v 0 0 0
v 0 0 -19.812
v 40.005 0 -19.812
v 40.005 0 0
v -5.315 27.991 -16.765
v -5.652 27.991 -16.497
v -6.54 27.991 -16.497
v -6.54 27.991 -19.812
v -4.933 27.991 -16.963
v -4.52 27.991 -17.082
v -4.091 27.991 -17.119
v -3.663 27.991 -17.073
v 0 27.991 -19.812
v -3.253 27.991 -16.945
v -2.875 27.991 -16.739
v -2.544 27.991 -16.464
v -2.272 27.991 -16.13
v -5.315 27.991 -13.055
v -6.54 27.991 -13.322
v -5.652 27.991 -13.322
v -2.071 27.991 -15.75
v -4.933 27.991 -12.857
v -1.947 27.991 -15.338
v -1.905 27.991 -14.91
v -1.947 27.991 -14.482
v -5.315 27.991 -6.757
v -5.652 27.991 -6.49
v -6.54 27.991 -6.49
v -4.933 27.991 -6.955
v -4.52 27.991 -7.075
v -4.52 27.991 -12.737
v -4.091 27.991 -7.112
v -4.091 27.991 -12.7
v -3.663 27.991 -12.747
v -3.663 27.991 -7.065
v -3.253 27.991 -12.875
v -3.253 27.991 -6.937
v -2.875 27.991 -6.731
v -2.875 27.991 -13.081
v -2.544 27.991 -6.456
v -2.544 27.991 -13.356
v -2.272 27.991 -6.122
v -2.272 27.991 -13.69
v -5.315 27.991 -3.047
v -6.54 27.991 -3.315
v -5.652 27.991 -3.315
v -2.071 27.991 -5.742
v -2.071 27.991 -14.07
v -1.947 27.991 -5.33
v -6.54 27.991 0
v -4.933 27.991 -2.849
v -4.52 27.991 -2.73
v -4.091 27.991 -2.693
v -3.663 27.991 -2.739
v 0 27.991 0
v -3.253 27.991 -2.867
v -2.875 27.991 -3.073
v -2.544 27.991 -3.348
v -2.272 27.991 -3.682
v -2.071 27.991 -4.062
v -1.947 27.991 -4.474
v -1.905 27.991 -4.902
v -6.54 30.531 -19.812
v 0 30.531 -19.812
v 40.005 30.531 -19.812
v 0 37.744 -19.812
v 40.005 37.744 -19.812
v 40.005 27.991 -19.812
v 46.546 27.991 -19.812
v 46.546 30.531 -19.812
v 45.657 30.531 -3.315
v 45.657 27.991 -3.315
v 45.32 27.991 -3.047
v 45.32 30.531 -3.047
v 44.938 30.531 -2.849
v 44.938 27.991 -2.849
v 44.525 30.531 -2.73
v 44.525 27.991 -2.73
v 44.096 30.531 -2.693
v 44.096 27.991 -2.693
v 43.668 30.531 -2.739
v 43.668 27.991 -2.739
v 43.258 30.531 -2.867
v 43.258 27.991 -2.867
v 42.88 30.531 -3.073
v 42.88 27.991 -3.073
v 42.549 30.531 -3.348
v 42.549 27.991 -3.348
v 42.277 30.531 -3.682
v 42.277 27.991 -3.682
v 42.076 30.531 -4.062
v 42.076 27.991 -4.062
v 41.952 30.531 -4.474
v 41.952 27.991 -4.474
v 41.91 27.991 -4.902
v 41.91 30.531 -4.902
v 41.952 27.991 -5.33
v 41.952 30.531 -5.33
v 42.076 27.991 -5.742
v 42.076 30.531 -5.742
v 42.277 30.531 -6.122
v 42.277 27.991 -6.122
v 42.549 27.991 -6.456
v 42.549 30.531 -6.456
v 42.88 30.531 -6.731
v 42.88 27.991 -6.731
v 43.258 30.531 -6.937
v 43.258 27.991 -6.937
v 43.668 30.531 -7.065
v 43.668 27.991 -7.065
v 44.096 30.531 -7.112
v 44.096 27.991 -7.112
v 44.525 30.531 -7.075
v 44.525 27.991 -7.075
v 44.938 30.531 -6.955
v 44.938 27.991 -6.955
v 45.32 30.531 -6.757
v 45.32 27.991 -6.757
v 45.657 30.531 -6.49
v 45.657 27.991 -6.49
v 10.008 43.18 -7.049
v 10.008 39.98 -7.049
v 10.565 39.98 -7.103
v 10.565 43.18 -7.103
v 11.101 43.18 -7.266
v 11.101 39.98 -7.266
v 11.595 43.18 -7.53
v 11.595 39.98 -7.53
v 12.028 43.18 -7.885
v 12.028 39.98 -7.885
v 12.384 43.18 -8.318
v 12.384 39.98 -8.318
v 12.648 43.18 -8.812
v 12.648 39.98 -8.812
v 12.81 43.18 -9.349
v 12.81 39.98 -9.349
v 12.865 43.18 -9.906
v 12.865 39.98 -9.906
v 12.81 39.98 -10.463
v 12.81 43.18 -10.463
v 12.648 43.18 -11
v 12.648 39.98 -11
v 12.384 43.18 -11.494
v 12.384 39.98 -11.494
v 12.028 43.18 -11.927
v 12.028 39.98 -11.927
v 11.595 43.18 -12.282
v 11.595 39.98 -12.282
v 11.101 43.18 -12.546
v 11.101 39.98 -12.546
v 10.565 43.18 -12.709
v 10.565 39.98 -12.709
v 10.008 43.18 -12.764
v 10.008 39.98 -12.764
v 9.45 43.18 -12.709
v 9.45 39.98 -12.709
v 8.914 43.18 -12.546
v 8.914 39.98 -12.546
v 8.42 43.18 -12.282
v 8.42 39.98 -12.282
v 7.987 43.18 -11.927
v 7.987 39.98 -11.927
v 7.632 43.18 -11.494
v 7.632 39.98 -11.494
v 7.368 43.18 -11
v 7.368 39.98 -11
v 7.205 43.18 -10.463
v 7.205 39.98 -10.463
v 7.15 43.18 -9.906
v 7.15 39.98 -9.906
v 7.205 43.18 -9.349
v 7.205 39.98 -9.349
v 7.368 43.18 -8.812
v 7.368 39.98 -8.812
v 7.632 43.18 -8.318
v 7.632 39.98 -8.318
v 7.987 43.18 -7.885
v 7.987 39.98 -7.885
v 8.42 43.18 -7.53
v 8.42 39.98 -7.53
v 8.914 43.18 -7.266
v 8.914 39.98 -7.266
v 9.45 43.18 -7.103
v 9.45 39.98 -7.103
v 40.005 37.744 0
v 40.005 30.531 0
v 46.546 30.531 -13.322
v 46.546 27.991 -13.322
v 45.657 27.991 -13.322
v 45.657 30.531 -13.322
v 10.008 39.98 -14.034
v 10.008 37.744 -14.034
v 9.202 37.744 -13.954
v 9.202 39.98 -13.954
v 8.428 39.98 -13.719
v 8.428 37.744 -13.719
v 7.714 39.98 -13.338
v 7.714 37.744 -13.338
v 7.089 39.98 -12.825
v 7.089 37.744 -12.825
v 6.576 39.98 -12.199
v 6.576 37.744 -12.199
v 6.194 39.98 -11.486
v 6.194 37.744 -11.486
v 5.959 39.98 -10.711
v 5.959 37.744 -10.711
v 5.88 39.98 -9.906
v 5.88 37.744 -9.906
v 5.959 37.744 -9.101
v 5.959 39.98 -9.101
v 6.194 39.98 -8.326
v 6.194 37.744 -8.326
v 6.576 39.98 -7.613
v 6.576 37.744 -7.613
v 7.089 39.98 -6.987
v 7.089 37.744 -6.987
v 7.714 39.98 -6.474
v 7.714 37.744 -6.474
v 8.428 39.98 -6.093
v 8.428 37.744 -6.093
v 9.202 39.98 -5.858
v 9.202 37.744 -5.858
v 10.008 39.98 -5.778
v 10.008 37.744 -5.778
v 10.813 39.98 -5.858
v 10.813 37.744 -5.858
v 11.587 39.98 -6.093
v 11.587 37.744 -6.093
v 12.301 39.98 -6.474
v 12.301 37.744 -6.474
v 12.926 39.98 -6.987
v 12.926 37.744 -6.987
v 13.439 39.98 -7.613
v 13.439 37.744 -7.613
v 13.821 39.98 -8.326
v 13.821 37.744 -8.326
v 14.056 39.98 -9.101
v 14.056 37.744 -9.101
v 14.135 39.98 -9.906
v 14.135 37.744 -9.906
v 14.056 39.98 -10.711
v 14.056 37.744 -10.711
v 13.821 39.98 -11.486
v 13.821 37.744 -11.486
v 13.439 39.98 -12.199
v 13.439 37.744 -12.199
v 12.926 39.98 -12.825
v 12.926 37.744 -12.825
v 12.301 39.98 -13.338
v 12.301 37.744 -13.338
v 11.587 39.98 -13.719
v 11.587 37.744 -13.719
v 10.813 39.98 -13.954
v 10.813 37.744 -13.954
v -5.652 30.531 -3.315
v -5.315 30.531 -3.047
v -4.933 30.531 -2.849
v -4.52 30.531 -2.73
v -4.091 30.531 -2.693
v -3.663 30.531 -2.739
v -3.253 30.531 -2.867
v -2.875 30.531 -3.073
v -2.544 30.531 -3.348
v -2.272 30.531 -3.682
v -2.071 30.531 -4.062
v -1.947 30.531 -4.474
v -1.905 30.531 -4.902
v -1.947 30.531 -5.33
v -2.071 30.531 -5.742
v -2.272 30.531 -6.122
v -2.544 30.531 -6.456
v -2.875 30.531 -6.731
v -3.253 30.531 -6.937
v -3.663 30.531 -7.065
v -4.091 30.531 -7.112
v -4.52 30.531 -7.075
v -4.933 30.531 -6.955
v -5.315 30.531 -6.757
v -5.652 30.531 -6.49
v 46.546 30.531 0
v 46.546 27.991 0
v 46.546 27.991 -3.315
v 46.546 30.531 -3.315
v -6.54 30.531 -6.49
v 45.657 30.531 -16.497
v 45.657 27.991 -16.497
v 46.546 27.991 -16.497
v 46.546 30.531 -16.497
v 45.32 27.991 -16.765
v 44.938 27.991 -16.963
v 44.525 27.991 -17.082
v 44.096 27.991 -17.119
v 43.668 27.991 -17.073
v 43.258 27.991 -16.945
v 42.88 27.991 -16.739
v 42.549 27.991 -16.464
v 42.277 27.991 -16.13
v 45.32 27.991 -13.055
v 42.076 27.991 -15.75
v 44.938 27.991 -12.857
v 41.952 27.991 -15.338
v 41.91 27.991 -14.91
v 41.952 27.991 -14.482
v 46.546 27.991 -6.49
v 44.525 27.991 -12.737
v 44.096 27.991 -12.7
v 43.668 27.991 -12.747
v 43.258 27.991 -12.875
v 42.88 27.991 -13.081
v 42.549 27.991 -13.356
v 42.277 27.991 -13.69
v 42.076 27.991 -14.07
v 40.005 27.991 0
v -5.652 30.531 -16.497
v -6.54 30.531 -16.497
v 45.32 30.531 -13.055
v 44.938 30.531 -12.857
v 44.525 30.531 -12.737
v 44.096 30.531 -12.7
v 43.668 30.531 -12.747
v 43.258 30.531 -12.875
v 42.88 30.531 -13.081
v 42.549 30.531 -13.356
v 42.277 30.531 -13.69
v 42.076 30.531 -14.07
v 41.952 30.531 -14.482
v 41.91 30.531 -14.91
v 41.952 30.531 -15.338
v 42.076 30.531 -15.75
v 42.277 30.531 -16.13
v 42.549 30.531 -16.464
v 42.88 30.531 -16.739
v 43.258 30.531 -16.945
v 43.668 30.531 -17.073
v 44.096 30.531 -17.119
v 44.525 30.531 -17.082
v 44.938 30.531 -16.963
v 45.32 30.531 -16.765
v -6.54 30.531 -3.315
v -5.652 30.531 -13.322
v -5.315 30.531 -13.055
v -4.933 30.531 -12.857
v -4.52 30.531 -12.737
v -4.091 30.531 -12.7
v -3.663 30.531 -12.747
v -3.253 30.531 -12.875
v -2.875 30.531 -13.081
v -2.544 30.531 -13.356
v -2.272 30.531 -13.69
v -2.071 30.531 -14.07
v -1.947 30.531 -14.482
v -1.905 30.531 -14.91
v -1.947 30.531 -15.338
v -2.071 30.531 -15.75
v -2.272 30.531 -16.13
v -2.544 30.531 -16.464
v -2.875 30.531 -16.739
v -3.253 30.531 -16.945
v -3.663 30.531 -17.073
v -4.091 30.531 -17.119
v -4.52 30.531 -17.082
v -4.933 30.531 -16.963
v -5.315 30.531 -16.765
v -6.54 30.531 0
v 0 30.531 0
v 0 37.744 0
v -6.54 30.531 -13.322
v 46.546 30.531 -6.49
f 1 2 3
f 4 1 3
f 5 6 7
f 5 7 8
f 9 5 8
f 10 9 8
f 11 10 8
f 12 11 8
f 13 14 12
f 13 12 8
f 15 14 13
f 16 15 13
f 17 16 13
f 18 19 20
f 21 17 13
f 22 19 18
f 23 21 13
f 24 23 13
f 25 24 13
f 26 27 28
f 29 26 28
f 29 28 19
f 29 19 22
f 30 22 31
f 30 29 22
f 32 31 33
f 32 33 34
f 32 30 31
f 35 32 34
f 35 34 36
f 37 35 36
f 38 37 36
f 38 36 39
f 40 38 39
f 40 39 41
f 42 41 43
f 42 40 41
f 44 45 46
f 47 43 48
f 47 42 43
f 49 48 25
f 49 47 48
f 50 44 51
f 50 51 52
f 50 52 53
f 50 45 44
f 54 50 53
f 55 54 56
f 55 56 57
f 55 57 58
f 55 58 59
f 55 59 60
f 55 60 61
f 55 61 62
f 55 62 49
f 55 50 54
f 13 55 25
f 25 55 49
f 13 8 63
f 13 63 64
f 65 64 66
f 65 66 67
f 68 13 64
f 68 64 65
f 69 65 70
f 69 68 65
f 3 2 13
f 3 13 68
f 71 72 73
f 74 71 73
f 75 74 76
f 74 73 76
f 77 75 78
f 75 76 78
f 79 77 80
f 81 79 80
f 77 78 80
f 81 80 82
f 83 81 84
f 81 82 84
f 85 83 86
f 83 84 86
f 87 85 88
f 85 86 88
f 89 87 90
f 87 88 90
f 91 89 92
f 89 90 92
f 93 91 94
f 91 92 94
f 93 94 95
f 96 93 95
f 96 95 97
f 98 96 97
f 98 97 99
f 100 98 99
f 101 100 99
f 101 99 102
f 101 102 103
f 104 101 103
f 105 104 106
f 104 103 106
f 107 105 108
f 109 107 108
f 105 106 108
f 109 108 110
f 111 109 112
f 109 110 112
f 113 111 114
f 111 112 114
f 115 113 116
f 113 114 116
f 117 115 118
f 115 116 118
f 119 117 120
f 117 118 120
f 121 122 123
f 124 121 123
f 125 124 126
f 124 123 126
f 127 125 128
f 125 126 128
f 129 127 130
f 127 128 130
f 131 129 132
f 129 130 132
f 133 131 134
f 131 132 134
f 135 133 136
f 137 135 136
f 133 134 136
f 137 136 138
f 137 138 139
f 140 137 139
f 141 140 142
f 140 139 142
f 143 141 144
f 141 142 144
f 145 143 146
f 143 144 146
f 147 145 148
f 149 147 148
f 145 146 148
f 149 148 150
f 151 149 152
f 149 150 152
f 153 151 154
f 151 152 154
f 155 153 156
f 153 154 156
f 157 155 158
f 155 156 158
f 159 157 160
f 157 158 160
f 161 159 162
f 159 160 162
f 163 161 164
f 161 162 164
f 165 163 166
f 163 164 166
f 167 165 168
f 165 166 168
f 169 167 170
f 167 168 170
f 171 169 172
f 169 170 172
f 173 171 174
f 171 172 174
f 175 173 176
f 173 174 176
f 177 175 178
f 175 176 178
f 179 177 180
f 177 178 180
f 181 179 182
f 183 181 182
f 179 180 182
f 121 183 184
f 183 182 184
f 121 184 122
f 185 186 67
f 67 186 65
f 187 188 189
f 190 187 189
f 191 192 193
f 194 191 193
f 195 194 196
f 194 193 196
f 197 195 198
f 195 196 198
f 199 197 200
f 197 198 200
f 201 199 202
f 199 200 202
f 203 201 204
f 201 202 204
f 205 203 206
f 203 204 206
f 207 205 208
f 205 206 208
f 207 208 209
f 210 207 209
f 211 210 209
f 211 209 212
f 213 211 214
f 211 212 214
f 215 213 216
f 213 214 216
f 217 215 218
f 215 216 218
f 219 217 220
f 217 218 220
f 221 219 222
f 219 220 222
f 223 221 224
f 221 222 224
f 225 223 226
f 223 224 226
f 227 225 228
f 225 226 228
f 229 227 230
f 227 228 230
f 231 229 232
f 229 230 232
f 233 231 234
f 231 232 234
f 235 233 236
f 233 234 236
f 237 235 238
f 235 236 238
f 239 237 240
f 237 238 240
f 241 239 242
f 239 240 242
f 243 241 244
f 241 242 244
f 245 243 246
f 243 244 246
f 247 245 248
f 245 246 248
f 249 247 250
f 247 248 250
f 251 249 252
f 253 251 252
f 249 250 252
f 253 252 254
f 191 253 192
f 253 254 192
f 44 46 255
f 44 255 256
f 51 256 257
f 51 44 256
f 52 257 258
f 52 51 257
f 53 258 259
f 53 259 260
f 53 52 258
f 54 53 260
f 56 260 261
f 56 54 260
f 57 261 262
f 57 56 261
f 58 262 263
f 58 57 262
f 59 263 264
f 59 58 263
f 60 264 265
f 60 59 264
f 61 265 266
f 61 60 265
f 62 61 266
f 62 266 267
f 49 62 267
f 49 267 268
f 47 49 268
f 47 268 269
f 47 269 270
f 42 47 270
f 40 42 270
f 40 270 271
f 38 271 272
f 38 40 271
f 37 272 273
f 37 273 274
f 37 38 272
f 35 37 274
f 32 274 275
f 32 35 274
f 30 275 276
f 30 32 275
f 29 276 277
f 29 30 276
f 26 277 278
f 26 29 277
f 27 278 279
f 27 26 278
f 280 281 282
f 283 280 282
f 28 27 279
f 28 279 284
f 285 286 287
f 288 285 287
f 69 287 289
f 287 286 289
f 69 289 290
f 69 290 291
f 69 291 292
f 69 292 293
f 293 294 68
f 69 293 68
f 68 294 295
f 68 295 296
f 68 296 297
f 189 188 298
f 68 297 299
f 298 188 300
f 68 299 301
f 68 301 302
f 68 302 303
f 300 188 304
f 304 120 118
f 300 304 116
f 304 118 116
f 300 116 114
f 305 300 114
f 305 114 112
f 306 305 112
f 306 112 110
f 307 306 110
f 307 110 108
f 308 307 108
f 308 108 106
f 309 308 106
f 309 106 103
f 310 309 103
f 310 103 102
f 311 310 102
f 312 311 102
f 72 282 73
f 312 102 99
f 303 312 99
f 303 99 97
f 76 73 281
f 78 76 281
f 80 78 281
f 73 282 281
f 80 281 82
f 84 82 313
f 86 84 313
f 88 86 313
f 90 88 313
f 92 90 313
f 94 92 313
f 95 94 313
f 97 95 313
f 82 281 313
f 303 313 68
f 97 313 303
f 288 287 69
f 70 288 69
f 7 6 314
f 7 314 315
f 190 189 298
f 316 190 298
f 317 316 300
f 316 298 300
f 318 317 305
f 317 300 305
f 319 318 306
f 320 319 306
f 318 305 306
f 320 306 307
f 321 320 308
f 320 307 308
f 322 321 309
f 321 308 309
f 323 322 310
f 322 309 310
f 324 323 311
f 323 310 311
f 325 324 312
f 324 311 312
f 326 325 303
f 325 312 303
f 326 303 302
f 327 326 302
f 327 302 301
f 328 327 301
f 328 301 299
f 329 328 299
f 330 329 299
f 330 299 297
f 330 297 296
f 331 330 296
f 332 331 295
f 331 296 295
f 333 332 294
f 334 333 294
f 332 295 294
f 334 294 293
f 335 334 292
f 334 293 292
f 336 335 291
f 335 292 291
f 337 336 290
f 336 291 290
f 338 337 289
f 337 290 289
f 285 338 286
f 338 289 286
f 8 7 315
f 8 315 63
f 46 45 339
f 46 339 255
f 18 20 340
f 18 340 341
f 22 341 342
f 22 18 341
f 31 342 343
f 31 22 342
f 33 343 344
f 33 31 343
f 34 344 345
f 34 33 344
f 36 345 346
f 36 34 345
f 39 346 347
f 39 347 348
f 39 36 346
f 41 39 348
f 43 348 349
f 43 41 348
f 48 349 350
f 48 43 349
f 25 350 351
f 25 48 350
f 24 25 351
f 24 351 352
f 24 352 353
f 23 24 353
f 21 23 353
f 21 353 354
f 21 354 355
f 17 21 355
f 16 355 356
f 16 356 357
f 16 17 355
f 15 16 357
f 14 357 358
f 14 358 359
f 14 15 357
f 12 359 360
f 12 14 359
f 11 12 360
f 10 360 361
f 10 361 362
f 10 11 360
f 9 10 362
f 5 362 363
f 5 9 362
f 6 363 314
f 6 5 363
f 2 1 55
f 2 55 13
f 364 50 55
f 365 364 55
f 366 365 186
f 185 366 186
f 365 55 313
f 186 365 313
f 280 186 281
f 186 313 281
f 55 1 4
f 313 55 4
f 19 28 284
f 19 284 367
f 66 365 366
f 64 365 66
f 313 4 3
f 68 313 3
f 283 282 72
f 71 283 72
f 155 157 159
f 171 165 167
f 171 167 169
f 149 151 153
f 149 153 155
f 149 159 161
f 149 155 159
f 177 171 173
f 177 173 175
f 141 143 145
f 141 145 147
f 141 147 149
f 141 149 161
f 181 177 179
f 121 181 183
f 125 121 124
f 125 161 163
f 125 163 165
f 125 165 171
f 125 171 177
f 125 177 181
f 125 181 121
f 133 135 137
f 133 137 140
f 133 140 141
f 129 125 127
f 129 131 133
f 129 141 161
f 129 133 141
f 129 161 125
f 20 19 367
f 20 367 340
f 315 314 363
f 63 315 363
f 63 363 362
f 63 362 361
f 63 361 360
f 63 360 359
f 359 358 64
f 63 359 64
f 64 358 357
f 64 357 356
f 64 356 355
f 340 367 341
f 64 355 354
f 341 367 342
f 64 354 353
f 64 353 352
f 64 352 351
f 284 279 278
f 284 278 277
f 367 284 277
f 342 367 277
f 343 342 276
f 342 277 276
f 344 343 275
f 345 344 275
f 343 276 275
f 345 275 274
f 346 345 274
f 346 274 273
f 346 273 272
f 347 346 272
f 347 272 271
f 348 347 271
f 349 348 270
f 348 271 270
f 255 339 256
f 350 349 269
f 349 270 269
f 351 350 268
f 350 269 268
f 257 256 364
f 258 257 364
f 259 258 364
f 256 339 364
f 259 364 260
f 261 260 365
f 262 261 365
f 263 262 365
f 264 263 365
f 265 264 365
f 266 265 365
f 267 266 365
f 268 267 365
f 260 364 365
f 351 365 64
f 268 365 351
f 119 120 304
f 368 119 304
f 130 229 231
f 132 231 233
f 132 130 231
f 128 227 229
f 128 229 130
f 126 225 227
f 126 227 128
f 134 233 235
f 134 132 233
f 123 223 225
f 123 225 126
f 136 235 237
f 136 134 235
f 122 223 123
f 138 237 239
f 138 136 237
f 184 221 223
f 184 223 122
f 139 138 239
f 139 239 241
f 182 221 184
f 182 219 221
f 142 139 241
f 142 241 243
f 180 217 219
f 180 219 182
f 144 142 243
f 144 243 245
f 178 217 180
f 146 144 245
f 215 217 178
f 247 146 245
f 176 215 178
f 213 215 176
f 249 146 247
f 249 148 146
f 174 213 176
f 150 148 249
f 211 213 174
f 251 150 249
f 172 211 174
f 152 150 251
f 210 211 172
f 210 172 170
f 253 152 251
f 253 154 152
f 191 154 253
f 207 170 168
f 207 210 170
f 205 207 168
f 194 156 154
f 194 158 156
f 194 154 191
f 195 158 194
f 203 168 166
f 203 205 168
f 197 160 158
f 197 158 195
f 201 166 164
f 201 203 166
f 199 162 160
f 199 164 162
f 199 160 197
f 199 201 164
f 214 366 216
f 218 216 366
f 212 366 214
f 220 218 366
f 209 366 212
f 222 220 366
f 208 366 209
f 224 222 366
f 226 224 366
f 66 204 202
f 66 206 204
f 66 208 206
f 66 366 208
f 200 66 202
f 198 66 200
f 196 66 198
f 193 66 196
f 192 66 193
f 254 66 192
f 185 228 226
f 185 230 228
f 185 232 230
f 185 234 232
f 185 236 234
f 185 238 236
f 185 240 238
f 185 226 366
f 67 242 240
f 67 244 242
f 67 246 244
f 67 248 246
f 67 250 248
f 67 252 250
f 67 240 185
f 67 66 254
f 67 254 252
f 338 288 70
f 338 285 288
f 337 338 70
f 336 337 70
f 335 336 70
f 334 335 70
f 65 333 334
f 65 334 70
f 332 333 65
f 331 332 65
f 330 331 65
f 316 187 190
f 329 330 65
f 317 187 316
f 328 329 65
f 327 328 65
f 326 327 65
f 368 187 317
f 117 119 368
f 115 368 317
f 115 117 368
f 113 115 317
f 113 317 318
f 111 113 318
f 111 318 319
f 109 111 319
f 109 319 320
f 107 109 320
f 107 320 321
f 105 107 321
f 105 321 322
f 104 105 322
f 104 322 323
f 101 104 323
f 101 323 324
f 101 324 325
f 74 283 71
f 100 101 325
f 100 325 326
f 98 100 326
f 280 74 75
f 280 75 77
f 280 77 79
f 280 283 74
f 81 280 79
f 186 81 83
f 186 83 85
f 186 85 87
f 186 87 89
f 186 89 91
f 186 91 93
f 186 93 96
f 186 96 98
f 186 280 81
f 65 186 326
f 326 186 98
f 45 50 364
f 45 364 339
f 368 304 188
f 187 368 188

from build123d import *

# Parameters (mm, degrees)
SKETCH1_W           = 40.005
SKETCH1_H           = 19.812
BOSS_EXTRUDE1_DEPTH = 37.7444
SKETCH2_R           = 4.1275
BOSS_EXTRUDE2_DEPTH = 2.2352
SKETCH3_R           = 2.8575
BOSS_EXTRUDE3_DEPTH = 3.2004
BOSS_EXTRUDE4_START = -27.9908
BOSS_EXTRUDE4_DEPTH = 2.54


with BuildPart() as part:
    # Sketch1 → Boss-Extrude1 (new body)
    with BuildSketch(Plane(origin=(0, 0, 0), x_dir=(1, 0, 0), z_dir=(0, 1, 0))):
        with Locations((20.0025, 9.906)):
            Rectangle(SKETCH1_W, SKETCH1_H)
    extrude(amount=BOSS_EXTRUDE1_DEPTH)

    # Sketch2 → Boss-Extrude2 (add)
    with BuildSketch(Plane(origin=(0, 37.7444, 0), x_dir=(1, 0, 0), z_dir=(0, 1, 0))):
        with Locations(Location((10.0076, 9.906, 0), (0, 0, 90))):
            Circle(SKETCH2_R)
    extrude(amount=BOSS_EXTRUDE2_DEPTH)

    # Sketch3 → Boss-Extrude3 (add)
    with BuildSketch(Plane(origin=(0, 39.9796, 0), x_dir=(1, 0, 0), z_dir=(0, 1, 0))):
        with Locations(Location((10.0076, 9.906, 0), (0, 0, 270))):
            Circle(SKETCH3_R)
    extrude(amount=BOSS_EXTRUDE3_DEPTH)

    # Sketch4 → Boss-Extrude4 (add)
    with BuildSketch(Plane.XZ.offset(BOSS_EXTRUDE4_START)):
        with BuildLine():
            Line((0, 0), (-6.5405, 0))
            Line((-6.5405, 0), (-6.5405, -3.3147))
            Line((-6.5405, -3.3147), (-5.652024704, -3.3147))
            ThreePointArc((-5.652024704, -3.3147), (-1.905, -4.9022), (-5.652024704, -6.4897))
            Line((-5.652024704, -6.4897), (-6.5405, -6.4897))
            Line((-6.5405, -6.4897), (-6.5405, -13.3223))
            Line((-6.5405, -13.3223), (-5.652024704, -13.3223))
            ThreePointArc((-5.652024704, -13.3223), (-1.905, -14.9098), (-5.652024704, -16.4973))
            Line((-5.652024704, -16.4973), (-6.5405, -16.4973))
            Line((-6.5405, -16.4973), (-6.5405, -19.812))
            Line((-6.5405, -19.812), (0, -19.812))
            Line((0, -19.812), (0, 0))
        make_face()
        with BuildLine():
            Line((46.5455, -16.4973), (46.5455, -19.812))
            Line((46.5455, -19.812), (40.005, -19.812))
            Line((40.005, -19.812), (40.005, 0))
            Line((40.005, 0), (46.5455, 0))
            Line((46.5455, 0), (46.5455, -3.3147))
            Line((46.5455, -3.3147), (45.657024704, -3.3147))
            ThreePointArc((45.657024704, -3.3147), (41.91, -4.9022), (45.657024704, -6.4897))
            Line((45.657024704, -6.4897), (46.5455, -6.4897))
            Line((46.5455, -6.4897), (46.5455, -13.3223))
            Line((46.5455, -13.3223), (45.657024704, -13.3223))
            ThreePointArc((45.657024704, -13.3223), (41.91, -14.9098), (45.657024704, -16.4973))
            Line((45.657024704, -16.4973), (46.5455, -16.4973))
        make_face()
    extrude(amount=-BOSS_EXTRUDE4_DEPTH)


solid = part.part
